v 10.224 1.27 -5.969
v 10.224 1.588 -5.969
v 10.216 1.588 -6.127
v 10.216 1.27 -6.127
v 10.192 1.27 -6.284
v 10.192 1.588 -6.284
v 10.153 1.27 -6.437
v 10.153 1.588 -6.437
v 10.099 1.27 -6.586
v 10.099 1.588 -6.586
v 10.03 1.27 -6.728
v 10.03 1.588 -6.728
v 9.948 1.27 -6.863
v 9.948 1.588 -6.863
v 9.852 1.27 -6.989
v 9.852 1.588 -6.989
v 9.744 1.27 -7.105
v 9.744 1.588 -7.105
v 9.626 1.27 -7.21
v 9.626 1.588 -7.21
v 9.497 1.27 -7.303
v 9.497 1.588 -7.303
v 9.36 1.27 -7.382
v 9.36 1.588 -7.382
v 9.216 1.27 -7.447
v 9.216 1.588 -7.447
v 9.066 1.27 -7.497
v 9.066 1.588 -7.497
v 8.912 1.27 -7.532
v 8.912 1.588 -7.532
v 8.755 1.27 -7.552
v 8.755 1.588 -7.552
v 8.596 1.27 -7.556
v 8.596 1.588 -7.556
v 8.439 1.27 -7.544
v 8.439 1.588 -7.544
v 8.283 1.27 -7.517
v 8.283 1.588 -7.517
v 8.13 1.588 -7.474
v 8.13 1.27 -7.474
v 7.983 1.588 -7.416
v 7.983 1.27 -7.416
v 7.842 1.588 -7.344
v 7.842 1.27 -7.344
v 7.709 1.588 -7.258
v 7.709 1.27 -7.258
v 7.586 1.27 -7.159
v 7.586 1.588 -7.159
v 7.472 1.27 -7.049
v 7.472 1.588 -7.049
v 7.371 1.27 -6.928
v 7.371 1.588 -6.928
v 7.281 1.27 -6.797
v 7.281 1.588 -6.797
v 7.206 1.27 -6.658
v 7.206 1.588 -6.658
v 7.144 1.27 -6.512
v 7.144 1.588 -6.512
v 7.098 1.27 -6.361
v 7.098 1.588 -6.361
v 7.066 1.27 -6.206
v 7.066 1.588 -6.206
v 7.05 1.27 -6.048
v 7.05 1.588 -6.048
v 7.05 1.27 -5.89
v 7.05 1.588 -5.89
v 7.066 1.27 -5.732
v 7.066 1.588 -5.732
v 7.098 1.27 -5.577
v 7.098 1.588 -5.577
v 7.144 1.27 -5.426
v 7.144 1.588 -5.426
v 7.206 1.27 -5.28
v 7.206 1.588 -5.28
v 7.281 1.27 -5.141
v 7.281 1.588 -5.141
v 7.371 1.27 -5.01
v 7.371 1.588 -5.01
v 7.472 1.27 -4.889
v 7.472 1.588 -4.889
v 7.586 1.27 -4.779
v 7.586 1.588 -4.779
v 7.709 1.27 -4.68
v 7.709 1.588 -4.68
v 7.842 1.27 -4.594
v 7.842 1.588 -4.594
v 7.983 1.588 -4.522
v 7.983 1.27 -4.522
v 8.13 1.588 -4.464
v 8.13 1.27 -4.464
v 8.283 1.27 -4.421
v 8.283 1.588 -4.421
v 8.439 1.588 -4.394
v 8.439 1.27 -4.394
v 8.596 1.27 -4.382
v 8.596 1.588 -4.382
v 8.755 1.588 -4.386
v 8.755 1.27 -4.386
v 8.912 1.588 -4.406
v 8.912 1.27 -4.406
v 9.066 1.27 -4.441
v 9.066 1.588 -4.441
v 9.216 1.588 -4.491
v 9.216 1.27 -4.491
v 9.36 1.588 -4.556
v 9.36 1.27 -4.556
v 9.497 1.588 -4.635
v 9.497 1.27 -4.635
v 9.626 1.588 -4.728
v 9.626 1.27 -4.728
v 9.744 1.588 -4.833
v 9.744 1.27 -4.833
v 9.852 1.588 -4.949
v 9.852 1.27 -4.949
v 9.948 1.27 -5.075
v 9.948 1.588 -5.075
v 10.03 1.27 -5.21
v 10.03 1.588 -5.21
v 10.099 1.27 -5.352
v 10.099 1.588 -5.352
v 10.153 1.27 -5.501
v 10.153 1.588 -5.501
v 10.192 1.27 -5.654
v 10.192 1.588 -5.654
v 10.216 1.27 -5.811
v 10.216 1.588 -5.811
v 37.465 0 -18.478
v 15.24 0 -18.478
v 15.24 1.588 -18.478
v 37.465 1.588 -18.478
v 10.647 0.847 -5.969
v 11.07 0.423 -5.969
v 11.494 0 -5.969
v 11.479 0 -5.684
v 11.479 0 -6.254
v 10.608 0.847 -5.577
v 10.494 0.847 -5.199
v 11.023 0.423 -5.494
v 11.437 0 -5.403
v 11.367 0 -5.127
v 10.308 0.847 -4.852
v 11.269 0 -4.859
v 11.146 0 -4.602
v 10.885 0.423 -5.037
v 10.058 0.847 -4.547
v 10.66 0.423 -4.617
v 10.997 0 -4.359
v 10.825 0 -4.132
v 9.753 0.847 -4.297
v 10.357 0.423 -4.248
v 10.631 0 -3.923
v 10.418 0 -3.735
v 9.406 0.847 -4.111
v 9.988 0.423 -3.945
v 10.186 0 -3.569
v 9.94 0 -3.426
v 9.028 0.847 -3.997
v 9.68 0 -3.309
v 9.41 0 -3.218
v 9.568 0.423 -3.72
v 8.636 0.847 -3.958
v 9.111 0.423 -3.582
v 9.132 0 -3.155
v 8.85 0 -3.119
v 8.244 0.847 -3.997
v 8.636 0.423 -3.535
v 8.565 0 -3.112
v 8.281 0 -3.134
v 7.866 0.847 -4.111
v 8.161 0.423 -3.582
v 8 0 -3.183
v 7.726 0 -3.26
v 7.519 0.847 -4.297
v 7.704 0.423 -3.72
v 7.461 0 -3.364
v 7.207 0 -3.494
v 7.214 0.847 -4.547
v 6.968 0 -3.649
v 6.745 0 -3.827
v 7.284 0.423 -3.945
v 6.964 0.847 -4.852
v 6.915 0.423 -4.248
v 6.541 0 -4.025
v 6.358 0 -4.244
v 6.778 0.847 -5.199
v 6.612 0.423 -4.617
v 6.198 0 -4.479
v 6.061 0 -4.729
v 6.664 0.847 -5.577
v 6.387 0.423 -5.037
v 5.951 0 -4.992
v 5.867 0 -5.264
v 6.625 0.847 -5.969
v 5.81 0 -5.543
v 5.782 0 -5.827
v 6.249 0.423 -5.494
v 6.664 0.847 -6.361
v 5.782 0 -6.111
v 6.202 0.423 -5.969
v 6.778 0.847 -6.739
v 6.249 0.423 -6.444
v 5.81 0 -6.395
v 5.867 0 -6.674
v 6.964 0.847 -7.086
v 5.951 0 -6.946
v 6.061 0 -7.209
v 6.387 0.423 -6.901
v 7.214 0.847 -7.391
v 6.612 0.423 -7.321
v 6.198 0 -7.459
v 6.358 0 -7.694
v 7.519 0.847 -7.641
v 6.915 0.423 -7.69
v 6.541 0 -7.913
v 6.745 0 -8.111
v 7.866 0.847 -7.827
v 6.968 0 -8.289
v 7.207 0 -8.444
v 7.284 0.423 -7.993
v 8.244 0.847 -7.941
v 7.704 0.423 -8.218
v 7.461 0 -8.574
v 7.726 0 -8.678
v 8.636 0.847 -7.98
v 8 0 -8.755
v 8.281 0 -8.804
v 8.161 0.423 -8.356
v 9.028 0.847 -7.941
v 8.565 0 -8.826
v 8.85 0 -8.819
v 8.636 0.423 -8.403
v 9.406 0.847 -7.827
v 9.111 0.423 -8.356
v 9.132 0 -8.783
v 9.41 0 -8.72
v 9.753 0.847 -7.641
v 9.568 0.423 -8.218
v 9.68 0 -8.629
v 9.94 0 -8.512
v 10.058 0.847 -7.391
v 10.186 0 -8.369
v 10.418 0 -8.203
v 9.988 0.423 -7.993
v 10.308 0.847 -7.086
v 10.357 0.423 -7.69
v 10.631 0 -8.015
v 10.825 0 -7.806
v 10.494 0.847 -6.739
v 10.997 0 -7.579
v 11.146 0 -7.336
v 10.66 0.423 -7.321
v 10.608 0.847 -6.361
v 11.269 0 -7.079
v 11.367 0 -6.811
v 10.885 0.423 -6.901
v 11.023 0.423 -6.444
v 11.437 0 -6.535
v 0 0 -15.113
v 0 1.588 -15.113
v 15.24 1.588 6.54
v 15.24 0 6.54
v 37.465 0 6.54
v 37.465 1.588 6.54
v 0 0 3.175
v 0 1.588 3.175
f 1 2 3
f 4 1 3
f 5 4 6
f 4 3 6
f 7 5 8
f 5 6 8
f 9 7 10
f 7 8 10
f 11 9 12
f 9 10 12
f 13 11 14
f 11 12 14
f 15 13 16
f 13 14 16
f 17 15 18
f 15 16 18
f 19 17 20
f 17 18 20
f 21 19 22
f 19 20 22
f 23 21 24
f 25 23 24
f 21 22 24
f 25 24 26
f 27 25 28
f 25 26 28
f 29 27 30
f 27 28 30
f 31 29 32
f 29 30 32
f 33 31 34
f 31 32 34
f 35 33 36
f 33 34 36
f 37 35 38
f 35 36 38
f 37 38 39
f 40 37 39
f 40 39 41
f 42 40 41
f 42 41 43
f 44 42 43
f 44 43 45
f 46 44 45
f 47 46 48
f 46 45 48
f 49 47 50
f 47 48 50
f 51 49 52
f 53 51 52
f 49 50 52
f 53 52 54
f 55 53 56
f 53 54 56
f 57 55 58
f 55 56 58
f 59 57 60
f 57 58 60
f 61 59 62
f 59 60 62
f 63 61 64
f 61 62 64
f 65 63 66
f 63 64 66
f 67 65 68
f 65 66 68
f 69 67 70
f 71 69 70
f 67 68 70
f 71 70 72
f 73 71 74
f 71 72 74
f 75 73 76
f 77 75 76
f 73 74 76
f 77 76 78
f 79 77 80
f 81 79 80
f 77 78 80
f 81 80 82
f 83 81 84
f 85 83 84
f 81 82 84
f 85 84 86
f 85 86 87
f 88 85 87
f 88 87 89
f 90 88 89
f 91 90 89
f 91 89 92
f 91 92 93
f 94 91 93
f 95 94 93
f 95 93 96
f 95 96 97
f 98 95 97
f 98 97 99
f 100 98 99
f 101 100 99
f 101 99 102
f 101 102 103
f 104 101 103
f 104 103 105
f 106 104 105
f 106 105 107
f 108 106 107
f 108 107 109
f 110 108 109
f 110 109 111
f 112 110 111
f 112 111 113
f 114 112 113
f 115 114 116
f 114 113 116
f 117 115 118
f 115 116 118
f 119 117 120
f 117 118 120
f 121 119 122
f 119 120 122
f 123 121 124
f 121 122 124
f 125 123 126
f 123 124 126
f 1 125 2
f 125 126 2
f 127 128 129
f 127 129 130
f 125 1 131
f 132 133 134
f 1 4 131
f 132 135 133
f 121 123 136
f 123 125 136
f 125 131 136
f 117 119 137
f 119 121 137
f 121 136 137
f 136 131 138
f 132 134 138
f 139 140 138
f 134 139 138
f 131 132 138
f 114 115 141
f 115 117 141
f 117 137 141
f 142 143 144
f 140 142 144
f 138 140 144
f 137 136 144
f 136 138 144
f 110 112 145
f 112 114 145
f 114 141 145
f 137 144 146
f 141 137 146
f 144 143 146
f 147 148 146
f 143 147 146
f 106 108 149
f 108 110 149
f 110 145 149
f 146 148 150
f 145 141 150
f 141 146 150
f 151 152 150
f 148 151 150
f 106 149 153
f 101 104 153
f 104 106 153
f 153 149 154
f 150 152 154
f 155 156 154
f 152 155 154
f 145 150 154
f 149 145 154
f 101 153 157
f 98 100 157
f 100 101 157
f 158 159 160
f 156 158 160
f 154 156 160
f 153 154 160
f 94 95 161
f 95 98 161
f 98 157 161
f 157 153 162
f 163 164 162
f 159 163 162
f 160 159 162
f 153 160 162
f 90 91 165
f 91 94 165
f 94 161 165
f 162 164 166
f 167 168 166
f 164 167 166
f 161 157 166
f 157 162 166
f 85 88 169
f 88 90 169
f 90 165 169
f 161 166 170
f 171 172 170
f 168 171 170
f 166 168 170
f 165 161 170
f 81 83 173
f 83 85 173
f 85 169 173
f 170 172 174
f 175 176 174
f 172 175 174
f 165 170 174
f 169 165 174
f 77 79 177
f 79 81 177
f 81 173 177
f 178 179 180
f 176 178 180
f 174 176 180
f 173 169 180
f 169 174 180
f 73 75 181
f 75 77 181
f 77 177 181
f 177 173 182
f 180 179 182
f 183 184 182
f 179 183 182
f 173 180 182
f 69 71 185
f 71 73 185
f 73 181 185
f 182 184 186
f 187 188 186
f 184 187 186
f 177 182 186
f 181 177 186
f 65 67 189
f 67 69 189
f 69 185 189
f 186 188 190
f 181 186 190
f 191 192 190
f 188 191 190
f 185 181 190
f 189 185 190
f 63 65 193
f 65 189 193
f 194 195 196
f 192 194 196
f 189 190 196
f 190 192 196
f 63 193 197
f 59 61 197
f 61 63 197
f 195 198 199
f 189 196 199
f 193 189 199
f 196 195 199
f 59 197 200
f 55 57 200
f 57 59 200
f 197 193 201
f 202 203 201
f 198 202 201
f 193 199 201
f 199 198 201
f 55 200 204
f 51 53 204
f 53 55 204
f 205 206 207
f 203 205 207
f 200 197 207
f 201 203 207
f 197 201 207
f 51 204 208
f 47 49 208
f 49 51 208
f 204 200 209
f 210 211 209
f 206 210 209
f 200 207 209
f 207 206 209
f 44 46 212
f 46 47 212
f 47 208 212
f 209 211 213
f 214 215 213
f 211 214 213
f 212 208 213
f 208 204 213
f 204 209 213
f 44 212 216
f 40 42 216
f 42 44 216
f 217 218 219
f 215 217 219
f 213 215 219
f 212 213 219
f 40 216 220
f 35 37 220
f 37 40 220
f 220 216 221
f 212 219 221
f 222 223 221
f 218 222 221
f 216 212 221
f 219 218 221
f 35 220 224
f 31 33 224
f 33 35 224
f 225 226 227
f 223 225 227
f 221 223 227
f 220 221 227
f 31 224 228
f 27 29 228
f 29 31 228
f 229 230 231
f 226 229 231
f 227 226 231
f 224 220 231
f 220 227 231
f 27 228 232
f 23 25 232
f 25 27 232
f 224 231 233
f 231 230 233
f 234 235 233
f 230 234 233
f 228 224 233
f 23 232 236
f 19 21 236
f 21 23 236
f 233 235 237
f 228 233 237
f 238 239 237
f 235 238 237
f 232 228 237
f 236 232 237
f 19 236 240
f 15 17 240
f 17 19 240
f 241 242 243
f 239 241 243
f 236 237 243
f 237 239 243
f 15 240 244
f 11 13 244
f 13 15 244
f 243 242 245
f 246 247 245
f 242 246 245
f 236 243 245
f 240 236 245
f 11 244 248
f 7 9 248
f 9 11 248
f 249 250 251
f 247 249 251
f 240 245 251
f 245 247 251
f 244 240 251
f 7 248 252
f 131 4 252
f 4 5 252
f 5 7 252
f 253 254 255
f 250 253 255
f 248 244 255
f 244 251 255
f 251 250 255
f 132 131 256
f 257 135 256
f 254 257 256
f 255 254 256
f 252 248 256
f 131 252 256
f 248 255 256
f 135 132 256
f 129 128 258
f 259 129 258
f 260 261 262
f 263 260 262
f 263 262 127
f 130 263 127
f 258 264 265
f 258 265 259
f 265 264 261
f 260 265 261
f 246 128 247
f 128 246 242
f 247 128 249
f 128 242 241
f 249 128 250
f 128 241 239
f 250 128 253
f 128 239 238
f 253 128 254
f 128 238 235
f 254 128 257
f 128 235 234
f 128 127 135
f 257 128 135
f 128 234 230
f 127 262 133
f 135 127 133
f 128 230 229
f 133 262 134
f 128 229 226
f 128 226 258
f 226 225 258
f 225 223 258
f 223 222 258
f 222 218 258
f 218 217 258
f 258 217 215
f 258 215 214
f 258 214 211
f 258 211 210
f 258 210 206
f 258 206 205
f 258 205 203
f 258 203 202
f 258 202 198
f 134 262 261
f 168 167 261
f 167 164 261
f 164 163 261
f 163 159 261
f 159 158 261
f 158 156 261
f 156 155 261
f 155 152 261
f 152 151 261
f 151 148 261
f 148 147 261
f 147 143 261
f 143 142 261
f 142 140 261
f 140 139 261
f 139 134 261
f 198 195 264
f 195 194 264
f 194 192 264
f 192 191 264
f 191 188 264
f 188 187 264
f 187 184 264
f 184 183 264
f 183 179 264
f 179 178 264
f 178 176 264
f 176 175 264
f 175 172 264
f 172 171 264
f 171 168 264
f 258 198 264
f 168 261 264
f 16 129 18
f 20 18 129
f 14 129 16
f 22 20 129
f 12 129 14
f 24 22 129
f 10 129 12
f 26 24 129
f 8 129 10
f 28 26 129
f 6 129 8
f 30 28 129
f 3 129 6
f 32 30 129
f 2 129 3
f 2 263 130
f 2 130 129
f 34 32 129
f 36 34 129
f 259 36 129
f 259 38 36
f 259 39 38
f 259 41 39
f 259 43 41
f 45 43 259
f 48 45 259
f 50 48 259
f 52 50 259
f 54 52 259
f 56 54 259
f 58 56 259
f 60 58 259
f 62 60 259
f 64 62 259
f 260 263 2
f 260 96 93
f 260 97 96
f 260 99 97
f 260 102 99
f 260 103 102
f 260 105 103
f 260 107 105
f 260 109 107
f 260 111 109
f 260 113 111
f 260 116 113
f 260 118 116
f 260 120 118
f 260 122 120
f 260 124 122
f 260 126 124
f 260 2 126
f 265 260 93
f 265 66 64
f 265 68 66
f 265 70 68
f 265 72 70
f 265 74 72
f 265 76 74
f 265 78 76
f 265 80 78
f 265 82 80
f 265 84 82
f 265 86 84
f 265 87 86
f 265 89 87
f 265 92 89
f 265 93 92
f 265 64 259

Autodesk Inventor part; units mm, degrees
ref_plane "YZ Plane" through (0, 0, 0) normal (1, 0, 0) x (0, 1, 0)
ref_plane "XZ Plane" through (0, 0, 0) normal (0, 1, 0) x (-1, 0, 0)
ref_plane "XY Plane" through (0, 0, 0) normal (0, 0, 1) x (1, 0, 0)
sketch "Sketch1" plane through (0, 0, 0) normal (0, 1, 0) x (-1, 0, 0)
  line L0 (0, 0) -> (0, -11.938)
  line L1 (-15.24, 3.3655) -> (-15.24, -15.3035)
  line L2 (0, 0) -> (-15.24, 3.3655)
  line L3 (0, -11.938) -> (-15.24, -15.3035)
  line L4 (-15.24, 3.3655) -> (-19.05, 3.3655)
  line L5 (-19.05, 3.3655) -> (-19.05, 2.0955)
  line L6 (-19.05, 2.0955) -> (-15.24, 2.0955)
  line L7 (-15.24, 2.0955) -> (-15.24, 3.3655)
  line L8 (-15.24, -15.3035) -> (-19.05, -15.3035)
  line L9 (-19.05, -15.3035) -> (-19.05, -14.0335)
  line L10 (-19.05, -14.0335) -> (-15.24, -14.0335)
  line L11 (-15.24, -14.0335) -> (-15.24, -15.3035)
  line L12 (0, 0) -> (0, 3.175)
  line L13 (-15.24, 3.3655) -> (-15.24, 6.5405)
  line L14 (0, -11.938) -> (0, -15.113)
  line L15 (-15.24, -15.3035) -> (-15.24, -18.4785)
  line L16 (-15.24, -18.4785) -> (0, -15.113)
  line L17 (0, 3.175) -> (-15.24, 6.5405)
  line L18 (-15.24, 6.5405) -> (-34.29, 6.5405)
  line L19 (-19.05, 3.3655) -> (-34.29, 3.3655)
  line L20 (-34.29, 3.3655) -> (-34.29, 6.5405)
  line L21 (-15.24, -18.4785) -> (-34.29, -18.4785)
  line L22 (-34.29, -18.4785) -> (-34.29, -15.3035)
  line L23 (-34.29, -15.3035) -> (-19.05, -15.3035)
  line L24 (-34.29, 6.5405) -> (-37.465, 6.5405)
  line L25 (-37.465, 6.5405) -> (-37.465, -18.4785)
  line L26 (-37.465, -18.4785) -> (-34.29, -18.4785)
  line L27 (-34.29, -18.4785) -> (-34.29, 6.5405)
  line L28 (-15.24, -15.3035) -> (-34.29, -15.3035)
  line L29 (-34.29, -15.3035) -> (-34.29, 3.3655)
  line L30 (-34.29, 3.3655) -> (-15.24, 3.3655)
  line L31 (-15.24, 3.3655) -> (-15.24, -15.3035)
  line L32 (-15.24, 3.3655) -> (-34.29, 3.3655)
  line L33 (-34.29, 3.3655) -> (-34.29, 6.5405)
  line L34 (-34.29, 6.5405) -> (-15.24, 6.5405)
  line L35 (-15.24, 6.5405) -> (-15.24, 3.3655)
  dimension "d0" = 11.938
  dimension "d1" = 15.24
  dimension "d2" = 18.669
  dimension "d3" = 3.3655
  dimension "d4" = 3.81
  dimension "d5" = 1.27
  dimension "d6" = 3.81
  dimension "d7" = 1.27
  dimension "d8" = 3.175
  dimension "d9" = 3.175
  dimension "d10" = 3.175
  dimension "d11" = 3.175
  dimension "d12" = 19.05
  dimension "d13" = 3.175
extrude "Extrusion4" add sketch "Sketch1" along normal blind 1.5875
sketch "Sketch4" plane through (0, 1.5875, 0) normal (0, 1, 0) x (1, 0, 0)
  circle A0 centre (8.636, 5.969) radius 1.5875
  line L0 (0, 15.113) -> (0, -3.175) projected
  point P0 (0, 0)
  dimension "d26" = 3.175
  dimension "d27" = 8.636
extrude "Extrusion5" cut sketch "Sketch4" against normal blind 1.5875
chamfer "Chamfer2" distance 1.27 angle 45 1 edges at (7.0485, 0, -5.969)
equation "\"d3\" = -0.5 * d0 + 0.5 * d2"
properties part number "phototransistorMount2" material "ABS Plastic"
